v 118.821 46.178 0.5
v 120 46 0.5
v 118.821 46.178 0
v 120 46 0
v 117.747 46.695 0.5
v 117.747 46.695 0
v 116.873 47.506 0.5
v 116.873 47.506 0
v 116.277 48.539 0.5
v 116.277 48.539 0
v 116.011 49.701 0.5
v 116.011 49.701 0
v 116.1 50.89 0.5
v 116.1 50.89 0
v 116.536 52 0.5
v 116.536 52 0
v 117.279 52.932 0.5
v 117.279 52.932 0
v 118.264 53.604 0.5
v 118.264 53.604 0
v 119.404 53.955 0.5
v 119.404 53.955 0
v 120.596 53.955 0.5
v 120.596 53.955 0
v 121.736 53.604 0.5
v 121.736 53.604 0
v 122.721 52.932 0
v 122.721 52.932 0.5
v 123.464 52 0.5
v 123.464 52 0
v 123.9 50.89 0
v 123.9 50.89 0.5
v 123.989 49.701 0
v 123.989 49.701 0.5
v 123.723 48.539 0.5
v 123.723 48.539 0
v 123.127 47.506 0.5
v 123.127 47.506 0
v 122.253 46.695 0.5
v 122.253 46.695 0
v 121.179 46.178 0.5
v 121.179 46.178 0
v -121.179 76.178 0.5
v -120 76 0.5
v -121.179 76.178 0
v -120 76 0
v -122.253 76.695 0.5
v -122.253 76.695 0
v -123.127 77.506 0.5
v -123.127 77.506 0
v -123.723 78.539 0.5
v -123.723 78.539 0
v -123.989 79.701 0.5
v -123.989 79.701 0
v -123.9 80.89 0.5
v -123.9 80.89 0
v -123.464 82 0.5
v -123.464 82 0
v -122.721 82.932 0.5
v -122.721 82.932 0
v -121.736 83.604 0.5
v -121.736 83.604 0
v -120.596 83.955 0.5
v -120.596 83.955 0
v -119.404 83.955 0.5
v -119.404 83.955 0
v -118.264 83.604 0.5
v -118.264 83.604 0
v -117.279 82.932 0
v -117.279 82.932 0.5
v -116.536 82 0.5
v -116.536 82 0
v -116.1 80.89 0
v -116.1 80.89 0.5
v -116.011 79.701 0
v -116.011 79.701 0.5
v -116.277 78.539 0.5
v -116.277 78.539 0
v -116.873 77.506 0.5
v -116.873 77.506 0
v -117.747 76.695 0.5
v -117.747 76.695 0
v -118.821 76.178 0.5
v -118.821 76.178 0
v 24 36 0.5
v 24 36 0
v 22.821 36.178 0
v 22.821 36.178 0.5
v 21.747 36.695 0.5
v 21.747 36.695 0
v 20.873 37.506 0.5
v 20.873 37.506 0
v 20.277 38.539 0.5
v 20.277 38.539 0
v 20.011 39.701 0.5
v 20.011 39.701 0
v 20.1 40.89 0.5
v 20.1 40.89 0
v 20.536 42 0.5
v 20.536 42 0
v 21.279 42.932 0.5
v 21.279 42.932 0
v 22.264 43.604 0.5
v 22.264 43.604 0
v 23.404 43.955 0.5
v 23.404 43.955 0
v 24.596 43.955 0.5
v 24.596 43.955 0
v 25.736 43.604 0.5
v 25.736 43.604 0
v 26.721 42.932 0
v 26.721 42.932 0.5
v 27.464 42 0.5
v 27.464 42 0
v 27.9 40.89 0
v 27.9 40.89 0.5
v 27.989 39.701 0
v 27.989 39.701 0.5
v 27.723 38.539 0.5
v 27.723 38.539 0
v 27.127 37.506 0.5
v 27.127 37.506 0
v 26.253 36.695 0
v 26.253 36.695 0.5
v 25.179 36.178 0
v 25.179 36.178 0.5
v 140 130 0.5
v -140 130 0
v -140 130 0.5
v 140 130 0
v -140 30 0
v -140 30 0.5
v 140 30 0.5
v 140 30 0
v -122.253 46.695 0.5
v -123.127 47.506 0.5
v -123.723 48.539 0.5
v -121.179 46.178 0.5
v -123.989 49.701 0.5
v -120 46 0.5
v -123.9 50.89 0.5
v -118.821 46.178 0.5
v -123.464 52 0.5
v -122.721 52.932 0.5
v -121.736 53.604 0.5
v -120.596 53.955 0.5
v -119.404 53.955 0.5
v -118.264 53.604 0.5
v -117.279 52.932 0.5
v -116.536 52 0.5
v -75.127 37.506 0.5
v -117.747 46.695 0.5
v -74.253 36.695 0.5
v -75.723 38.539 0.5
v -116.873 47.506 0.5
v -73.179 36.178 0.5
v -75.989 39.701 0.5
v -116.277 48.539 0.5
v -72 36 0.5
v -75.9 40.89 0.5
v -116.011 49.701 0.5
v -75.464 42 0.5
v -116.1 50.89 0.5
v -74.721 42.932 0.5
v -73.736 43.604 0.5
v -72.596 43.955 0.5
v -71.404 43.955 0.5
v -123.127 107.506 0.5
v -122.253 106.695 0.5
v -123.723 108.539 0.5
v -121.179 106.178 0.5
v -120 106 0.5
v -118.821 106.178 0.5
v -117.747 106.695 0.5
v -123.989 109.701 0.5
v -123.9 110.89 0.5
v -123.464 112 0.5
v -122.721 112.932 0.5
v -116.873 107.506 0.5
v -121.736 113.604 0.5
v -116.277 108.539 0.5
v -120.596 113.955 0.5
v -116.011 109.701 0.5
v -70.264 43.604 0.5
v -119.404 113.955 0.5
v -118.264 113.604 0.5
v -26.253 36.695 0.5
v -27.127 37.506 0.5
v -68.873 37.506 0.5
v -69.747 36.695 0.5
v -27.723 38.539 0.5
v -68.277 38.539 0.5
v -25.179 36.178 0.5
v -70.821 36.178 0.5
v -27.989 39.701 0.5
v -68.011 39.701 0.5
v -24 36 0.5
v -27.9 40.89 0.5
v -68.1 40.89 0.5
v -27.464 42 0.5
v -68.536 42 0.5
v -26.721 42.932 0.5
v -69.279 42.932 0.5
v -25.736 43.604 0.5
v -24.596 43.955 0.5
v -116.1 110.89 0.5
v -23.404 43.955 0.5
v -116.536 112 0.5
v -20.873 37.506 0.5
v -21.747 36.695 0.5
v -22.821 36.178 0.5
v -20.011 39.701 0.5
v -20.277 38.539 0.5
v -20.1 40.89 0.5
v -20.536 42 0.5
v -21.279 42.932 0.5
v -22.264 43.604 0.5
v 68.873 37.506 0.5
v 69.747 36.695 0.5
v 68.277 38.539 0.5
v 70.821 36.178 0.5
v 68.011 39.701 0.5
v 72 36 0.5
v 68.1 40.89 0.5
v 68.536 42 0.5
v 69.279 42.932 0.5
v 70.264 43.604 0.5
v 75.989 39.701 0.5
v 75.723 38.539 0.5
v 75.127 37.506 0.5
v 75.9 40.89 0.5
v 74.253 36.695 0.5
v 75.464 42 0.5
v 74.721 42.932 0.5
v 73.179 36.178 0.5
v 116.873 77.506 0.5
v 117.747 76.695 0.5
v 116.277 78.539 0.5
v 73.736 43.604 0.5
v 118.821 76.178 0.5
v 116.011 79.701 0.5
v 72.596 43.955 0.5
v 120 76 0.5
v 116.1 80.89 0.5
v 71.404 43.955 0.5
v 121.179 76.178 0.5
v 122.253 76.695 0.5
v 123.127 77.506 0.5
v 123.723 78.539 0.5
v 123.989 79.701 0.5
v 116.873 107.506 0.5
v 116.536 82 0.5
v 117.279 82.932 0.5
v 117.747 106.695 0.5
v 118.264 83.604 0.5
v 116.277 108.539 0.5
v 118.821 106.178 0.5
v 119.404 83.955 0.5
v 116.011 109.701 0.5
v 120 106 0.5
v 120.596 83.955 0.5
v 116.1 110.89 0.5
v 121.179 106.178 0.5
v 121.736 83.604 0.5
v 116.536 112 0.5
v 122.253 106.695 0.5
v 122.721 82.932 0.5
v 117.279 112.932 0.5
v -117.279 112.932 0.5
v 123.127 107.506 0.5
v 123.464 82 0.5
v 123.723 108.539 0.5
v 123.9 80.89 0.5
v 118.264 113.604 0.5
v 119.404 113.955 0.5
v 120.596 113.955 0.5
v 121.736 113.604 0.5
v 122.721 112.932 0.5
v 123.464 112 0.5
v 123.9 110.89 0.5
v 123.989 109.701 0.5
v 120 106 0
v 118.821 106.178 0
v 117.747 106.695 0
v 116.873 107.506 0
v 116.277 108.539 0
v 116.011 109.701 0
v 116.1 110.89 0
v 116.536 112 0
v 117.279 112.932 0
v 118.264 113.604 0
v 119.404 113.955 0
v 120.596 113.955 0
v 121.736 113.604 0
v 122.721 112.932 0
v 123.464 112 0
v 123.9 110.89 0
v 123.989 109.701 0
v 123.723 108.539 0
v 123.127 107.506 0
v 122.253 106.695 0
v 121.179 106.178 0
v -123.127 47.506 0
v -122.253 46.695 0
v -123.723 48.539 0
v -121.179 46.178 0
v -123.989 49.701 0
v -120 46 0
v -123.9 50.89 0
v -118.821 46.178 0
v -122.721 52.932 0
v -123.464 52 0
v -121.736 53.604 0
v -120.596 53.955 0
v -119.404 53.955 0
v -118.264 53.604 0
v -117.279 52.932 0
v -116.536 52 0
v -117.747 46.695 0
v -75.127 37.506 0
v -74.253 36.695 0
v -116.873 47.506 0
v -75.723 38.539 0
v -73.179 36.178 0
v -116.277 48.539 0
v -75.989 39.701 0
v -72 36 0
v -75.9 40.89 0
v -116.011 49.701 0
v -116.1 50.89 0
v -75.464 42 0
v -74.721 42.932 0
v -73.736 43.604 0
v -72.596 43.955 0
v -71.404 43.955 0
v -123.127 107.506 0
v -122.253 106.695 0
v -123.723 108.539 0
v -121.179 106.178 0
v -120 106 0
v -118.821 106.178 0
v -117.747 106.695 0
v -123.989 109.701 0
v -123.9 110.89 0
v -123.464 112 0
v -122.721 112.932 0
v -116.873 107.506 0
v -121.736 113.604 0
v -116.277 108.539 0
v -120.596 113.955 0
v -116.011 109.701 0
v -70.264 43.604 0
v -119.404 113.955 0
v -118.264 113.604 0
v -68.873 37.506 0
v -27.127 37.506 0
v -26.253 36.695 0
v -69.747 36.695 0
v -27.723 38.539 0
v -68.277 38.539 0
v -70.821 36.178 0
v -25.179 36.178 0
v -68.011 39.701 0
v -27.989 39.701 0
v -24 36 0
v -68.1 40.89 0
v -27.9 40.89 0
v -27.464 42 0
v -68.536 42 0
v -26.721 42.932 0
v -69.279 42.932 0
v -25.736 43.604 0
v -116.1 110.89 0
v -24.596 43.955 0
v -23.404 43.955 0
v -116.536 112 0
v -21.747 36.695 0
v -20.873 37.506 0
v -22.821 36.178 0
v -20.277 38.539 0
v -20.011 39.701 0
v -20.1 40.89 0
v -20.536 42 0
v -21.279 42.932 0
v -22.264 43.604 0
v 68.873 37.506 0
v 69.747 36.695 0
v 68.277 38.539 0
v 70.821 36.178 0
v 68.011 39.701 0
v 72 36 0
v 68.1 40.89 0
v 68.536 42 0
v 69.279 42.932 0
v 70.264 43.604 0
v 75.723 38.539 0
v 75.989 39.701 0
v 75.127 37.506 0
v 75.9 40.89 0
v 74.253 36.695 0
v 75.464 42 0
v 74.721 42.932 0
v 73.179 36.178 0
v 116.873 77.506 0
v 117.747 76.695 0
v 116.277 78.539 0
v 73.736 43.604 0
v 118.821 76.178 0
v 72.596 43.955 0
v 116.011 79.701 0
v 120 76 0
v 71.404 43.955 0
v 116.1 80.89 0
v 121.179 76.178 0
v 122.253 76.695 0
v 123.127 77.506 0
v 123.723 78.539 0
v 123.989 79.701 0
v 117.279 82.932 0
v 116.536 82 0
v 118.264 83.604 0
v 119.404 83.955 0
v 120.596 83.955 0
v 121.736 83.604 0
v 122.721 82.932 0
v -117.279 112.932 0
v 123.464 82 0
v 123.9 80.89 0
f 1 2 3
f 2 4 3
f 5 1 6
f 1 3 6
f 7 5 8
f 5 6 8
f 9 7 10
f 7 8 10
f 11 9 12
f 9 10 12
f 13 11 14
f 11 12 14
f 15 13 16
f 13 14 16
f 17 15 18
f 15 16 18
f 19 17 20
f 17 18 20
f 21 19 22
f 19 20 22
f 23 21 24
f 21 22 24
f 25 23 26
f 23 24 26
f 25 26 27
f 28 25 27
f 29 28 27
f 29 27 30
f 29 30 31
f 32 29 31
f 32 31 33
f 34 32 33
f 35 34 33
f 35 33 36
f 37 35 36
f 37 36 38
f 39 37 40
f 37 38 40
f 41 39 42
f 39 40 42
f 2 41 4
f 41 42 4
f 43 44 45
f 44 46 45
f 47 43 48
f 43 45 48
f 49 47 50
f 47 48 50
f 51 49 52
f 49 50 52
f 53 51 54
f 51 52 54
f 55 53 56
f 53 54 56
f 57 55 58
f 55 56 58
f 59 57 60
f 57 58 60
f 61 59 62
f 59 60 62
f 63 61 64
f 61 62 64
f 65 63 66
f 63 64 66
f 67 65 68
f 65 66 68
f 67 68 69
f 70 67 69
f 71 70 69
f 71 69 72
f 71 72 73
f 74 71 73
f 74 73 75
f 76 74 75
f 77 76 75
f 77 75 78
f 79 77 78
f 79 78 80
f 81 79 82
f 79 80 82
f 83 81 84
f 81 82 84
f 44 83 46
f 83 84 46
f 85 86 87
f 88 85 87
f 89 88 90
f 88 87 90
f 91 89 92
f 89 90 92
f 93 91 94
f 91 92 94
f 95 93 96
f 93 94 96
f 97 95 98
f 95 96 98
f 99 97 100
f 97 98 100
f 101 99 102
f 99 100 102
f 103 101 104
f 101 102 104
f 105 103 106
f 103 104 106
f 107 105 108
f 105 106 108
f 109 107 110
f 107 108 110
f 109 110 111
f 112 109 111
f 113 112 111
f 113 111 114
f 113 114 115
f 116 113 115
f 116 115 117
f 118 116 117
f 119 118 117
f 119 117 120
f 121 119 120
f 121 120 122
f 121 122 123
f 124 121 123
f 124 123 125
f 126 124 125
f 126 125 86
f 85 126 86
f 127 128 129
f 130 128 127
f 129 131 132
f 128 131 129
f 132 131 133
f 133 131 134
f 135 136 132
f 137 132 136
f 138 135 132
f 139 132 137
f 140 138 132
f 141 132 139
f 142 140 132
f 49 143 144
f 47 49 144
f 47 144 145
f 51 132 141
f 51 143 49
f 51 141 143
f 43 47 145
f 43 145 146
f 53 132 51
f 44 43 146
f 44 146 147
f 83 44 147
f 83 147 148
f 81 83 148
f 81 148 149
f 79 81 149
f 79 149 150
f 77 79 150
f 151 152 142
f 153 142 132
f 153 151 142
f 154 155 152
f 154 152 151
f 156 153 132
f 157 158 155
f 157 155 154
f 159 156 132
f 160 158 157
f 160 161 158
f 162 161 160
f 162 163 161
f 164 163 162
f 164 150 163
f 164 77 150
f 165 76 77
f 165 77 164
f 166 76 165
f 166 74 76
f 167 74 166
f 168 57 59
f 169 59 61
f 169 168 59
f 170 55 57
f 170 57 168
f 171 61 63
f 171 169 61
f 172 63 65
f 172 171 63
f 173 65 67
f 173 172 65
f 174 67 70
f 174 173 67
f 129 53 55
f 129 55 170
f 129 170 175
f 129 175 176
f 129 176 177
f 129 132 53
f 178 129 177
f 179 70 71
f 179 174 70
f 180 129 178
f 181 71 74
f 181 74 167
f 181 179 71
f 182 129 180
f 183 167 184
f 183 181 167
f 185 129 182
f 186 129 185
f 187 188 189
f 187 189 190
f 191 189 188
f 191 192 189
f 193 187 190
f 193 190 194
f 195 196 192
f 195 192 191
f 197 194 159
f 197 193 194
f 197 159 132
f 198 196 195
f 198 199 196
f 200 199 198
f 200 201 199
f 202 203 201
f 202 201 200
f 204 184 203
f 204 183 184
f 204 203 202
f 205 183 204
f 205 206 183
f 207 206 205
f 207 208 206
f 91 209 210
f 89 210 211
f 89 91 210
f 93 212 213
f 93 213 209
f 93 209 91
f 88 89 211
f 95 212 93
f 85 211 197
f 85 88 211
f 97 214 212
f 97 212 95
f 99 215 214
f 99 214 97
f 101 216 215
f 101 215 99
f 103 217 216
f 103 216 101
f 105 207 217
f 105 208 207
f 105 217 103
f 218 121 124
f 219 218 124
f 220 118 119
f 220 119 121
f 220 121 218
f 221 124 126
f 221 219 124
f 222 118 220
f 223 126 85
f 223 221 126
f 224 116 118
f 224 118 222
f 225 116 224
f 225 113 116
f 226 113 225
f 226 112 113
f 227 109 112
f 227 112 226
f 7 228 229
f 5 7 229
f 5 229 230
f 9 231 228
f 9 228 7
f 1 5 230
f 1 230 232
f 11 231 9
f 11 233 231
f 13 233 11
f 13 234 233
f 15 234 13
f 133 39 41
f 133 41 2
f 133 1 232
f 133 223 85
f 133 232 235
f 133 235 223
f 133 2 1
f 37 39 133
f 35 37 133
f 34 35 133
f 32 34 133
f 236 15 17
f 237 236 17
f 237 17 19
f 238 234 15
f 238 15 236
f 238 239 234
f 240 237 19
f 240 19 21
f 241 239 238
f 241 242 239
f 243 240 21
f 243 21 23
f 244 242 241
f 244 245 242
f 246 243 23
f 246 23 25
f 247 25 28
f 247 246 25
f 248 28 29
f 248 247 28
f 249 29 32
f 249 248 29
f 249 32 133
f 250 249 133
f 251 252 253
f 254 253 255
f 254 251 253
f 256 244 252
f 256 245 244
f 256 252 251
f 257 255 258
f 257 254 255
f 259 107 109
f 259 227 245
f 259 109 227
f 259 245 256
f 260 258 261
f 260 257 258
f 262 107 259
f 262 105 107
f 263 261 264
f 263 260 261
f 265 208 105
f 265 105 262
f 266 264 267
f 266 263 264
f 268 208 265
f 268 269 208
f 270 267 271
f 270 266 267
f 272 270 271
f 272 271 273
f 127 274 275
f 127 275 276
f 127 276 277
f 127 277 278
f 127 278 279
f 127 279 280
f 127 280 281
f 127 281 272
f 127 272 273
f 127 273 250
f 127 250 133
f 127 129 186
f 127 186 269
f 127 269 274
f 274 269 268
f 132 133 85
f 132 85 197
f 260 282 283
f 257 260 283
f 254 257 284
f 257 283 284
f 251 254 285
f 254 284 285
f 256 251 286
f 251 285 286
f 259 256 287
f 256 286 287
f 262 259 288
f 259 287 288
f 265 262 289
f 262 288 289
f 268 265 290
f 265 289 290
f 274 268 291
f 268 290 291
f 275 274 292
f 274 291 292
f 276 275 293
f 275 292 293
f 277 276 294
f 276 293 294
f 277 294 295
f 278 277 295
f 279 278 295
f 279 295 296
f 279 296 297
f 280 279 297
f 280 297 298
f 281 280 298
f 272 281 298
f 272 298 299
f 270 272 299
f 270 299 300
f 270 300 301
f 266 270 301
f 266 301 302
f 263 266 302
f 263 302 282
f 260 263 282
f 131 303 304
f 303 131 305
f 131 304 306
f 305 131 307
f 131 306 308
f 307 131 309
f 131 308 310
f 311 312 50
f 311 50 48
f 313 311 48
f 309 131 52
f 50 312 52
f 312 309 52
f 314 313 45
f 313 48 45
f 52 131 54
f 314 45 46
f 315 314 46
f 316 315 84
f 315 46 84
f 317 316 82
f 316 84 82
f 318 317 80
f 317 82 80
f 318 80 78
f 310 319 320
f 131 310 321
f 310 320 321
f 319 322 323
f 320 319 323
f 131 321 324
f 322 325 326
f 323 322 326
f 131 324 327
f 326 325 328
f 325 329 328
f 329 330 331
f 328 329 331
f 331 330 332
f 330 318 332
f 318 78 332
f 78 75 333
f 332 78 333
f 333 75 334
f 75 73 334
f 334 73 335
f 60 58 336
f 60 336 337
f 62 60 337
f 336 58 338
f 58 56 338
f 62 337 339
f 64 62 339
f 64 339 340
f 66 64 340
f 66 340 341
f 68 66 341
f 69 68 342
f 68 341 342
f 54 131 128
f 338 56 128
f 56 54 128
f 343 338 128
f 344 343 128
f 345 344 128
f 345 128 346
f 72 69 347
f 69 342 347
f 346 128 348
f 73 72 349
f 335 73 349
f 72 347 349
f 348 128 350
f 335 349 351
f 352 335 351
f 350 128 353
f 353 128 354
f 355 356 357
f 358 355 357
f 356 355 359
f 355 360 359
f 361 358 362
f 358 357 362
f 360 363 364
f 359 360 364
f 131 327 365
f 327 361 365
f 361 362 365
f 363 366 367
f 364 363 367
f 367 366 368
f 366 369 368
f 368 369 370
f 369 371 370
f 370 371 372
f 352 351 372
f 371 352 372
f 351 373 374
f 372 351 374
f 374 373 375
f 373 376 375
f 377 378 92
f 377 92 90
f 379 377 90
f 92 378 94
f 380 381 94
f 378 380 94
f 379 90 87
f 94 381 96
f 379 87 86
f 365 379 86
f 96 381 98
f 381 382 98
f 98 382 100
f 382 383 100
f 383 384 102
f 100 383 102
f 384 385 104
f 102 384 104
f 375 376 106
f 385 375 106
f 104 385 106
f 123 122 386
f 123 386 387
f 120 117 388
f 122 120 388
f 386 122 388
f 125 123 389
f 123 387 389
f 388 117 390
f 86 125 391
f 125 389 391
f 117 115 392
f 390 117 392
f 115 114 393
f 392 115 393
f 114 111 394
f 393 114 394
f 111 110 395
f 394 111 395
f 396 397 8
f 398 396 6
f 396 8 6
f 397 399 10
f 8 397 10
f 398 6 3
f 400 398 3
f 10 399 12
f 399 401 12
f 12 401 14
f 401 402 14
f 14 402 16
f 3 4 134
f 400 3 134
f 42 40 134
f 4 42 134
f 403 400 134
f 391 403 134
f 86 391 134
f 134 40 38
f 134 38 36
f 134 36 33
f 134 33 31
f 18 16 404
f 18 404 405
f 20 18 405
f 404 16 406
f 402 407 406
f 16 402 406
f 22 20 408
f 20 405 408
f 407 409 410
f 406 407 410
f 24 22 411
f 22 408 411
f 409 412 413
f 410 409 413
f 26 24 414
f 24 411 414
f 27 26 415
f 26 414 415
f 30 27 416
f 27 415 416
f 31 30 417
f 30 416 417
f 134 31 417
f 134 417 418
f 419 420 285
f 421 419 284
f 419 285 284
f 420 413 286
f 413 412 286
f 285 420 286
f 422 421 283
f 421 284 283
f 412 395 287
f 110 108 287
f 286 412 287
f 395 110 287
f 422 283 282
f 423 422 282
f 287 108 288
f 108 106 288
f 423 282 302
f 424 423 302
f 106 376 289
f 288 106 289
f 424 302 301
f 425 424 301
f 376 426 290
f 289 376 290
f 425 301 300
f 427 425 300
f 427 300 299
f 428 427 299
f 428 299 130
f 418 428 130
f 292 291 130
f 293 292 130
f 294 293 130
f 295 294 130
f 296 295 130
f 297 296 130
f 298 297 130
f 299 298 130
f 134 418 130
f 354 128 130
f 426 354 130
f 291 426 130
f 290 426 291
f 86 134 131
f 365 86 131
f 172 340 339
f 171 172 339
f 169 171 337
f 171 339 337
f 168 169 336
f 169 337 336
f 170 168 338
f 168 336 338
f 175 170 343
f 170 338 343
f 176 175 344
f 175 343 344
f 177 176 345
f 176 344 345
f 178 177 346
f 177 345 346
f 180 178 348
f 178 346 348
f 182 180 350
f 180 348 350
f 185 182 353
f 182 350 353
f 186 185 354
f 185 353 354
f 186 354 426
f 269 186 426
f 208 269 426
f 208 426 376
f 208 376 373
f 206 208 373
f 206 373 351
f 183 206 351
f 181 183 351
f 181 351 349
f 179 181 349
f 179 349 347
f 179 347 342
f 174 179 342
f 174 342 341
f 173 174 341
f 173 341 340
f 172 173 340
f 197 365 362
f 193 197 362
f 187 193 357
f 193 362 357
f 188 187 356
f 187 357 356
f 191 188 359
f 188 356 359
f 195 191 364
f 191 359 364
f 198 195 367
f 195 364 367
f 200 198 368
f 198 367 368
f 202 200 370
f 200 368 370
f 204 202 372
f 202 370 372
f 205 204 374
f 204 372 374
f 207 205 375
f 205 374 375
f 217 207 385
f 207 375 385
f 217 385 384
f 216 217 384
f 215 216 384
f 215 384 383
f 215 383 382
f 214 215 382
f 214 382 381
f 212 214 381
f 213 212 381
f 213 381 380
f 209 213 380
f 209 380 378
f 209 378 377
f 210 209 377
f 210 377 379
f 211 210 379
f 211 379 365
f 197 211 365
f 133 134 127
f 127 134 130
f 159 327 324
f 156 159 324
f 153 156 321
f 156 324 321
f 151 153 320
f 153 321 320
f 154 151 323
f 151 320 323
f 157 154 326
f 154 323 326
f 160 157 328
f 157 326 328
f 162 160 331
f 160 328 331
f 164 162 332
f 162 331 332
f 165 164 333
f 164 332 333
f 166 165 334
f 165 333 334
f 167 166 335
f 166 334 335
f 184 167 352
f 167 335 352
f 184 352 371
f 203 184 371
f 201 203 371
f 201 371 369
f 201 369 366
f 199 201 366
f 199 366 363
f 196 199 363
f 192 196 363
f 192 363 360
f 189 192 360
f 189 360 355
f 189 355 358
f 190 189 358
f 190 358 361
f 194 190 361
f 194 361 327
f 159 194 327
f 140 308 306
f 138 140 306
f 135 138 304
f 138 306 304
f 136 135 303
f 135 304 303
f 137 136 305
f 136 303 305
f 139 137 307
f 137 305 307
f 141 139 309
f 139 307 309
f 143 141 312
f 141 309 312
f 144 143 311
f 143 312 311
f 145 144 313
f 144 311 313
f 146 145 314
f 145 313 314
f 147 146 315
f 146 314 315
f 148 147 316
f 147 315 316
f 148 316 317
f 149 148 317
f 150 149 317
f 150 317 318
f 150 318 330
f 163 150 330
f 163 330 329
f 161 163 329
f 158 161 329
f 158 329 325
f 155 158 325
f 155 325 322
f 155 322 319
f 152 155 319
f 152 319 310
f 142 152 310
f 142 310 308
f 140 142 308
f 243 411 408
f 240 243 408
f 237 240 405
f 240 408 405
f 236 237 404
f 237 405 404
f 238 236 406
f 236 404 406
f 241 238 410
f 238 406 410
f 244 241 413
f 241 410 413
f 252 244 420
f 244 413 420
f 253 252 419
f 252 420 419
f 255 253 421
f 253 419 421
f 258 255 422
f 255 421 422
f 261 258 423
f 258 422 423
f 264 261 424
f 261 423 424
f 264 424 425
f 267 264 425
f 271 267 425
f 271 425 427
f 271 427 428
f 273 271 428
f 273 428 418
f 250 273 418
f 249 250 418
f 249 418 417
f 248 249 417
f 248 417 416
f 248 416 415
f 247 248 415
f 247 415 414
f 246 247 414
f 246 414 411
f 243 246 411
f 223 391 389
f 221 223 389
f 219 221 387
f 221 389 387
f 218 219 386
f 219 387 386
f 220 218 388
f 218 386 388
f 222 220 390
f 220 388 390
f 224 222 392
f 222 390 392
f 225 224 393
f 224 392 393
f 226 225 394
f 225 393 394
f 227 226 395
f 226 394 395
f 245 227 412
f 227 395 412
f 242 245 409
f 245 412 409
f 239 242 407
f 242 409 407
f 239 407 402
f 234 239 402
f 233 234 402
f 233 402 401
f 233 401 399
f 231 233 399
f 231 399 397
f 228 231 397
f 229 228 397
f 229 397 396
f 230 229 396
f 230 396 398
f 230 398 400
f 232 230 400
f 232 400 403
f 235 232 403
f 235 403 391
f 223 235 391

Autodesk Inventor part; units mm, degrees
ref_plane "YZ Plane" through (0, 0, 0) normal (1, 0, 0) x (0, 1, 0)
ref_plane "XZ Plane" through (0, 0, 0) normal (0, 1, 0) x (-1, 0, 0)
ref_plane "XY Plane" through (0, 0, 0) normal (0, 0, 1) x (1, 0, 0)
sketch "Sketch1" plane through (0, 0, 0) normal (0, 0, 1) x (1, 0, 0)
  line L0 (-140, 30) -> (-140, 130)
  line L1 (-140, 130) -> (0, 130)
  line L2 (0, 130) -> (0, 0) construction
  line L3 (140, 30) -> (140, 130)
  line L4 (140, 130) -> (0, 130)
  line L5 (-140, 30) -> (-100, 30)
  line L6 (100, 30) -> (140, 30)
  line L7 (-100, 130) -> (-100, 30)
  line L8 (100, 130) -> (100, 30)
  line L9 (-100, 30) -> (100, 30)
  point P0 (-100, 30)
  point P1 (100, 30)
  dimension "d0" = 140
  dimension "d57" = 40
  dimension "d58" = 40
  dimension "d88" = 100
extrude "Plate3" add sketch "Sketch1" along normal blind 0.5
sketch "Sketch7" plane through (0, 0, 0.5) normal (0, 0, 1) x (1, 0, 0)
  line L0 (-140, 130) -> (140, 130) projected
  line L1 (-140, 30) -> (-140, 130) projected
  line L2 (140, 130) -> (140, 30) projected
  point P0 (0, 0)
  point P1 (-120, 110)
  point P2 (-120, 80)
  point P3 (-120, 50)
  point P4 (120, 110)
  point P5 (120, 80)
  point P6 (120, 50)
  dimension "d98" = 20
  dimension "d99" = 50
  dimension "d100" = 80
  dimension "d101" = 20
  dimension "d102" = 20
  dimension "d103" = 50
  dimension "d104" = 80
  dimension "d105" = 20
hole "Hole6" at (-120, 110, 0.5) at (-120, 80, 0.5) at (-120, 50, 0.5) at (120, 110, 0.5) at (120, 80, 0.5) at (120, 50, 0.5) direction (0, 0, -1) diameter 8 end through all
sketch "Sketch8" plane through (0, 0, 0.5) normal (0, 0, 1) x (1, 0, 0)
  line L0 (0, -26) -> (0, 156) projected
  line L1 (140, 30) -> (-140, 30) projected
  point P0 (0, 0)
  point P1 (-72, 40)
  point P2 (-24, 40)
  point P3 (24, 40)
  point P4 (72, 40)
  dimension "d117" = 24
  dimension "d118" = 48
  dimension "d119" = 48
  dimension "d120" = 48
  dimension "d121" = 10
hole "Hole7" at (-72, 40, 0.5) at (-24, 40, 0.5) at (24, 40, 0.5) at (72, 40, 0.5) direction (0, 0, -1) diameter 8 end through all
equation "\"d96\" = Thickness"
equation "\"d111\" = Thickness"
equation "\"d90\" = Thickness"
equation "\"BendRadius\" = Thickness"
equation "\"BendReliefWidth\" = Thickness"
equation "\"BendReliefDepth\" = 0.5 * Thickness"
equation "\"CornerReliefSize\" = 4 * Thickness"
equation "\"MinimumRemnant\" = 2 * Thickness"
equation "\"TransitionRadius\" = BendRadius"
equation "\"JacobiRadiusSize\" = BendRadius"
equation "\"GapSize\" = Thickness"
equation "\"Thickness\" = 0.5"
properties part number "New side"
